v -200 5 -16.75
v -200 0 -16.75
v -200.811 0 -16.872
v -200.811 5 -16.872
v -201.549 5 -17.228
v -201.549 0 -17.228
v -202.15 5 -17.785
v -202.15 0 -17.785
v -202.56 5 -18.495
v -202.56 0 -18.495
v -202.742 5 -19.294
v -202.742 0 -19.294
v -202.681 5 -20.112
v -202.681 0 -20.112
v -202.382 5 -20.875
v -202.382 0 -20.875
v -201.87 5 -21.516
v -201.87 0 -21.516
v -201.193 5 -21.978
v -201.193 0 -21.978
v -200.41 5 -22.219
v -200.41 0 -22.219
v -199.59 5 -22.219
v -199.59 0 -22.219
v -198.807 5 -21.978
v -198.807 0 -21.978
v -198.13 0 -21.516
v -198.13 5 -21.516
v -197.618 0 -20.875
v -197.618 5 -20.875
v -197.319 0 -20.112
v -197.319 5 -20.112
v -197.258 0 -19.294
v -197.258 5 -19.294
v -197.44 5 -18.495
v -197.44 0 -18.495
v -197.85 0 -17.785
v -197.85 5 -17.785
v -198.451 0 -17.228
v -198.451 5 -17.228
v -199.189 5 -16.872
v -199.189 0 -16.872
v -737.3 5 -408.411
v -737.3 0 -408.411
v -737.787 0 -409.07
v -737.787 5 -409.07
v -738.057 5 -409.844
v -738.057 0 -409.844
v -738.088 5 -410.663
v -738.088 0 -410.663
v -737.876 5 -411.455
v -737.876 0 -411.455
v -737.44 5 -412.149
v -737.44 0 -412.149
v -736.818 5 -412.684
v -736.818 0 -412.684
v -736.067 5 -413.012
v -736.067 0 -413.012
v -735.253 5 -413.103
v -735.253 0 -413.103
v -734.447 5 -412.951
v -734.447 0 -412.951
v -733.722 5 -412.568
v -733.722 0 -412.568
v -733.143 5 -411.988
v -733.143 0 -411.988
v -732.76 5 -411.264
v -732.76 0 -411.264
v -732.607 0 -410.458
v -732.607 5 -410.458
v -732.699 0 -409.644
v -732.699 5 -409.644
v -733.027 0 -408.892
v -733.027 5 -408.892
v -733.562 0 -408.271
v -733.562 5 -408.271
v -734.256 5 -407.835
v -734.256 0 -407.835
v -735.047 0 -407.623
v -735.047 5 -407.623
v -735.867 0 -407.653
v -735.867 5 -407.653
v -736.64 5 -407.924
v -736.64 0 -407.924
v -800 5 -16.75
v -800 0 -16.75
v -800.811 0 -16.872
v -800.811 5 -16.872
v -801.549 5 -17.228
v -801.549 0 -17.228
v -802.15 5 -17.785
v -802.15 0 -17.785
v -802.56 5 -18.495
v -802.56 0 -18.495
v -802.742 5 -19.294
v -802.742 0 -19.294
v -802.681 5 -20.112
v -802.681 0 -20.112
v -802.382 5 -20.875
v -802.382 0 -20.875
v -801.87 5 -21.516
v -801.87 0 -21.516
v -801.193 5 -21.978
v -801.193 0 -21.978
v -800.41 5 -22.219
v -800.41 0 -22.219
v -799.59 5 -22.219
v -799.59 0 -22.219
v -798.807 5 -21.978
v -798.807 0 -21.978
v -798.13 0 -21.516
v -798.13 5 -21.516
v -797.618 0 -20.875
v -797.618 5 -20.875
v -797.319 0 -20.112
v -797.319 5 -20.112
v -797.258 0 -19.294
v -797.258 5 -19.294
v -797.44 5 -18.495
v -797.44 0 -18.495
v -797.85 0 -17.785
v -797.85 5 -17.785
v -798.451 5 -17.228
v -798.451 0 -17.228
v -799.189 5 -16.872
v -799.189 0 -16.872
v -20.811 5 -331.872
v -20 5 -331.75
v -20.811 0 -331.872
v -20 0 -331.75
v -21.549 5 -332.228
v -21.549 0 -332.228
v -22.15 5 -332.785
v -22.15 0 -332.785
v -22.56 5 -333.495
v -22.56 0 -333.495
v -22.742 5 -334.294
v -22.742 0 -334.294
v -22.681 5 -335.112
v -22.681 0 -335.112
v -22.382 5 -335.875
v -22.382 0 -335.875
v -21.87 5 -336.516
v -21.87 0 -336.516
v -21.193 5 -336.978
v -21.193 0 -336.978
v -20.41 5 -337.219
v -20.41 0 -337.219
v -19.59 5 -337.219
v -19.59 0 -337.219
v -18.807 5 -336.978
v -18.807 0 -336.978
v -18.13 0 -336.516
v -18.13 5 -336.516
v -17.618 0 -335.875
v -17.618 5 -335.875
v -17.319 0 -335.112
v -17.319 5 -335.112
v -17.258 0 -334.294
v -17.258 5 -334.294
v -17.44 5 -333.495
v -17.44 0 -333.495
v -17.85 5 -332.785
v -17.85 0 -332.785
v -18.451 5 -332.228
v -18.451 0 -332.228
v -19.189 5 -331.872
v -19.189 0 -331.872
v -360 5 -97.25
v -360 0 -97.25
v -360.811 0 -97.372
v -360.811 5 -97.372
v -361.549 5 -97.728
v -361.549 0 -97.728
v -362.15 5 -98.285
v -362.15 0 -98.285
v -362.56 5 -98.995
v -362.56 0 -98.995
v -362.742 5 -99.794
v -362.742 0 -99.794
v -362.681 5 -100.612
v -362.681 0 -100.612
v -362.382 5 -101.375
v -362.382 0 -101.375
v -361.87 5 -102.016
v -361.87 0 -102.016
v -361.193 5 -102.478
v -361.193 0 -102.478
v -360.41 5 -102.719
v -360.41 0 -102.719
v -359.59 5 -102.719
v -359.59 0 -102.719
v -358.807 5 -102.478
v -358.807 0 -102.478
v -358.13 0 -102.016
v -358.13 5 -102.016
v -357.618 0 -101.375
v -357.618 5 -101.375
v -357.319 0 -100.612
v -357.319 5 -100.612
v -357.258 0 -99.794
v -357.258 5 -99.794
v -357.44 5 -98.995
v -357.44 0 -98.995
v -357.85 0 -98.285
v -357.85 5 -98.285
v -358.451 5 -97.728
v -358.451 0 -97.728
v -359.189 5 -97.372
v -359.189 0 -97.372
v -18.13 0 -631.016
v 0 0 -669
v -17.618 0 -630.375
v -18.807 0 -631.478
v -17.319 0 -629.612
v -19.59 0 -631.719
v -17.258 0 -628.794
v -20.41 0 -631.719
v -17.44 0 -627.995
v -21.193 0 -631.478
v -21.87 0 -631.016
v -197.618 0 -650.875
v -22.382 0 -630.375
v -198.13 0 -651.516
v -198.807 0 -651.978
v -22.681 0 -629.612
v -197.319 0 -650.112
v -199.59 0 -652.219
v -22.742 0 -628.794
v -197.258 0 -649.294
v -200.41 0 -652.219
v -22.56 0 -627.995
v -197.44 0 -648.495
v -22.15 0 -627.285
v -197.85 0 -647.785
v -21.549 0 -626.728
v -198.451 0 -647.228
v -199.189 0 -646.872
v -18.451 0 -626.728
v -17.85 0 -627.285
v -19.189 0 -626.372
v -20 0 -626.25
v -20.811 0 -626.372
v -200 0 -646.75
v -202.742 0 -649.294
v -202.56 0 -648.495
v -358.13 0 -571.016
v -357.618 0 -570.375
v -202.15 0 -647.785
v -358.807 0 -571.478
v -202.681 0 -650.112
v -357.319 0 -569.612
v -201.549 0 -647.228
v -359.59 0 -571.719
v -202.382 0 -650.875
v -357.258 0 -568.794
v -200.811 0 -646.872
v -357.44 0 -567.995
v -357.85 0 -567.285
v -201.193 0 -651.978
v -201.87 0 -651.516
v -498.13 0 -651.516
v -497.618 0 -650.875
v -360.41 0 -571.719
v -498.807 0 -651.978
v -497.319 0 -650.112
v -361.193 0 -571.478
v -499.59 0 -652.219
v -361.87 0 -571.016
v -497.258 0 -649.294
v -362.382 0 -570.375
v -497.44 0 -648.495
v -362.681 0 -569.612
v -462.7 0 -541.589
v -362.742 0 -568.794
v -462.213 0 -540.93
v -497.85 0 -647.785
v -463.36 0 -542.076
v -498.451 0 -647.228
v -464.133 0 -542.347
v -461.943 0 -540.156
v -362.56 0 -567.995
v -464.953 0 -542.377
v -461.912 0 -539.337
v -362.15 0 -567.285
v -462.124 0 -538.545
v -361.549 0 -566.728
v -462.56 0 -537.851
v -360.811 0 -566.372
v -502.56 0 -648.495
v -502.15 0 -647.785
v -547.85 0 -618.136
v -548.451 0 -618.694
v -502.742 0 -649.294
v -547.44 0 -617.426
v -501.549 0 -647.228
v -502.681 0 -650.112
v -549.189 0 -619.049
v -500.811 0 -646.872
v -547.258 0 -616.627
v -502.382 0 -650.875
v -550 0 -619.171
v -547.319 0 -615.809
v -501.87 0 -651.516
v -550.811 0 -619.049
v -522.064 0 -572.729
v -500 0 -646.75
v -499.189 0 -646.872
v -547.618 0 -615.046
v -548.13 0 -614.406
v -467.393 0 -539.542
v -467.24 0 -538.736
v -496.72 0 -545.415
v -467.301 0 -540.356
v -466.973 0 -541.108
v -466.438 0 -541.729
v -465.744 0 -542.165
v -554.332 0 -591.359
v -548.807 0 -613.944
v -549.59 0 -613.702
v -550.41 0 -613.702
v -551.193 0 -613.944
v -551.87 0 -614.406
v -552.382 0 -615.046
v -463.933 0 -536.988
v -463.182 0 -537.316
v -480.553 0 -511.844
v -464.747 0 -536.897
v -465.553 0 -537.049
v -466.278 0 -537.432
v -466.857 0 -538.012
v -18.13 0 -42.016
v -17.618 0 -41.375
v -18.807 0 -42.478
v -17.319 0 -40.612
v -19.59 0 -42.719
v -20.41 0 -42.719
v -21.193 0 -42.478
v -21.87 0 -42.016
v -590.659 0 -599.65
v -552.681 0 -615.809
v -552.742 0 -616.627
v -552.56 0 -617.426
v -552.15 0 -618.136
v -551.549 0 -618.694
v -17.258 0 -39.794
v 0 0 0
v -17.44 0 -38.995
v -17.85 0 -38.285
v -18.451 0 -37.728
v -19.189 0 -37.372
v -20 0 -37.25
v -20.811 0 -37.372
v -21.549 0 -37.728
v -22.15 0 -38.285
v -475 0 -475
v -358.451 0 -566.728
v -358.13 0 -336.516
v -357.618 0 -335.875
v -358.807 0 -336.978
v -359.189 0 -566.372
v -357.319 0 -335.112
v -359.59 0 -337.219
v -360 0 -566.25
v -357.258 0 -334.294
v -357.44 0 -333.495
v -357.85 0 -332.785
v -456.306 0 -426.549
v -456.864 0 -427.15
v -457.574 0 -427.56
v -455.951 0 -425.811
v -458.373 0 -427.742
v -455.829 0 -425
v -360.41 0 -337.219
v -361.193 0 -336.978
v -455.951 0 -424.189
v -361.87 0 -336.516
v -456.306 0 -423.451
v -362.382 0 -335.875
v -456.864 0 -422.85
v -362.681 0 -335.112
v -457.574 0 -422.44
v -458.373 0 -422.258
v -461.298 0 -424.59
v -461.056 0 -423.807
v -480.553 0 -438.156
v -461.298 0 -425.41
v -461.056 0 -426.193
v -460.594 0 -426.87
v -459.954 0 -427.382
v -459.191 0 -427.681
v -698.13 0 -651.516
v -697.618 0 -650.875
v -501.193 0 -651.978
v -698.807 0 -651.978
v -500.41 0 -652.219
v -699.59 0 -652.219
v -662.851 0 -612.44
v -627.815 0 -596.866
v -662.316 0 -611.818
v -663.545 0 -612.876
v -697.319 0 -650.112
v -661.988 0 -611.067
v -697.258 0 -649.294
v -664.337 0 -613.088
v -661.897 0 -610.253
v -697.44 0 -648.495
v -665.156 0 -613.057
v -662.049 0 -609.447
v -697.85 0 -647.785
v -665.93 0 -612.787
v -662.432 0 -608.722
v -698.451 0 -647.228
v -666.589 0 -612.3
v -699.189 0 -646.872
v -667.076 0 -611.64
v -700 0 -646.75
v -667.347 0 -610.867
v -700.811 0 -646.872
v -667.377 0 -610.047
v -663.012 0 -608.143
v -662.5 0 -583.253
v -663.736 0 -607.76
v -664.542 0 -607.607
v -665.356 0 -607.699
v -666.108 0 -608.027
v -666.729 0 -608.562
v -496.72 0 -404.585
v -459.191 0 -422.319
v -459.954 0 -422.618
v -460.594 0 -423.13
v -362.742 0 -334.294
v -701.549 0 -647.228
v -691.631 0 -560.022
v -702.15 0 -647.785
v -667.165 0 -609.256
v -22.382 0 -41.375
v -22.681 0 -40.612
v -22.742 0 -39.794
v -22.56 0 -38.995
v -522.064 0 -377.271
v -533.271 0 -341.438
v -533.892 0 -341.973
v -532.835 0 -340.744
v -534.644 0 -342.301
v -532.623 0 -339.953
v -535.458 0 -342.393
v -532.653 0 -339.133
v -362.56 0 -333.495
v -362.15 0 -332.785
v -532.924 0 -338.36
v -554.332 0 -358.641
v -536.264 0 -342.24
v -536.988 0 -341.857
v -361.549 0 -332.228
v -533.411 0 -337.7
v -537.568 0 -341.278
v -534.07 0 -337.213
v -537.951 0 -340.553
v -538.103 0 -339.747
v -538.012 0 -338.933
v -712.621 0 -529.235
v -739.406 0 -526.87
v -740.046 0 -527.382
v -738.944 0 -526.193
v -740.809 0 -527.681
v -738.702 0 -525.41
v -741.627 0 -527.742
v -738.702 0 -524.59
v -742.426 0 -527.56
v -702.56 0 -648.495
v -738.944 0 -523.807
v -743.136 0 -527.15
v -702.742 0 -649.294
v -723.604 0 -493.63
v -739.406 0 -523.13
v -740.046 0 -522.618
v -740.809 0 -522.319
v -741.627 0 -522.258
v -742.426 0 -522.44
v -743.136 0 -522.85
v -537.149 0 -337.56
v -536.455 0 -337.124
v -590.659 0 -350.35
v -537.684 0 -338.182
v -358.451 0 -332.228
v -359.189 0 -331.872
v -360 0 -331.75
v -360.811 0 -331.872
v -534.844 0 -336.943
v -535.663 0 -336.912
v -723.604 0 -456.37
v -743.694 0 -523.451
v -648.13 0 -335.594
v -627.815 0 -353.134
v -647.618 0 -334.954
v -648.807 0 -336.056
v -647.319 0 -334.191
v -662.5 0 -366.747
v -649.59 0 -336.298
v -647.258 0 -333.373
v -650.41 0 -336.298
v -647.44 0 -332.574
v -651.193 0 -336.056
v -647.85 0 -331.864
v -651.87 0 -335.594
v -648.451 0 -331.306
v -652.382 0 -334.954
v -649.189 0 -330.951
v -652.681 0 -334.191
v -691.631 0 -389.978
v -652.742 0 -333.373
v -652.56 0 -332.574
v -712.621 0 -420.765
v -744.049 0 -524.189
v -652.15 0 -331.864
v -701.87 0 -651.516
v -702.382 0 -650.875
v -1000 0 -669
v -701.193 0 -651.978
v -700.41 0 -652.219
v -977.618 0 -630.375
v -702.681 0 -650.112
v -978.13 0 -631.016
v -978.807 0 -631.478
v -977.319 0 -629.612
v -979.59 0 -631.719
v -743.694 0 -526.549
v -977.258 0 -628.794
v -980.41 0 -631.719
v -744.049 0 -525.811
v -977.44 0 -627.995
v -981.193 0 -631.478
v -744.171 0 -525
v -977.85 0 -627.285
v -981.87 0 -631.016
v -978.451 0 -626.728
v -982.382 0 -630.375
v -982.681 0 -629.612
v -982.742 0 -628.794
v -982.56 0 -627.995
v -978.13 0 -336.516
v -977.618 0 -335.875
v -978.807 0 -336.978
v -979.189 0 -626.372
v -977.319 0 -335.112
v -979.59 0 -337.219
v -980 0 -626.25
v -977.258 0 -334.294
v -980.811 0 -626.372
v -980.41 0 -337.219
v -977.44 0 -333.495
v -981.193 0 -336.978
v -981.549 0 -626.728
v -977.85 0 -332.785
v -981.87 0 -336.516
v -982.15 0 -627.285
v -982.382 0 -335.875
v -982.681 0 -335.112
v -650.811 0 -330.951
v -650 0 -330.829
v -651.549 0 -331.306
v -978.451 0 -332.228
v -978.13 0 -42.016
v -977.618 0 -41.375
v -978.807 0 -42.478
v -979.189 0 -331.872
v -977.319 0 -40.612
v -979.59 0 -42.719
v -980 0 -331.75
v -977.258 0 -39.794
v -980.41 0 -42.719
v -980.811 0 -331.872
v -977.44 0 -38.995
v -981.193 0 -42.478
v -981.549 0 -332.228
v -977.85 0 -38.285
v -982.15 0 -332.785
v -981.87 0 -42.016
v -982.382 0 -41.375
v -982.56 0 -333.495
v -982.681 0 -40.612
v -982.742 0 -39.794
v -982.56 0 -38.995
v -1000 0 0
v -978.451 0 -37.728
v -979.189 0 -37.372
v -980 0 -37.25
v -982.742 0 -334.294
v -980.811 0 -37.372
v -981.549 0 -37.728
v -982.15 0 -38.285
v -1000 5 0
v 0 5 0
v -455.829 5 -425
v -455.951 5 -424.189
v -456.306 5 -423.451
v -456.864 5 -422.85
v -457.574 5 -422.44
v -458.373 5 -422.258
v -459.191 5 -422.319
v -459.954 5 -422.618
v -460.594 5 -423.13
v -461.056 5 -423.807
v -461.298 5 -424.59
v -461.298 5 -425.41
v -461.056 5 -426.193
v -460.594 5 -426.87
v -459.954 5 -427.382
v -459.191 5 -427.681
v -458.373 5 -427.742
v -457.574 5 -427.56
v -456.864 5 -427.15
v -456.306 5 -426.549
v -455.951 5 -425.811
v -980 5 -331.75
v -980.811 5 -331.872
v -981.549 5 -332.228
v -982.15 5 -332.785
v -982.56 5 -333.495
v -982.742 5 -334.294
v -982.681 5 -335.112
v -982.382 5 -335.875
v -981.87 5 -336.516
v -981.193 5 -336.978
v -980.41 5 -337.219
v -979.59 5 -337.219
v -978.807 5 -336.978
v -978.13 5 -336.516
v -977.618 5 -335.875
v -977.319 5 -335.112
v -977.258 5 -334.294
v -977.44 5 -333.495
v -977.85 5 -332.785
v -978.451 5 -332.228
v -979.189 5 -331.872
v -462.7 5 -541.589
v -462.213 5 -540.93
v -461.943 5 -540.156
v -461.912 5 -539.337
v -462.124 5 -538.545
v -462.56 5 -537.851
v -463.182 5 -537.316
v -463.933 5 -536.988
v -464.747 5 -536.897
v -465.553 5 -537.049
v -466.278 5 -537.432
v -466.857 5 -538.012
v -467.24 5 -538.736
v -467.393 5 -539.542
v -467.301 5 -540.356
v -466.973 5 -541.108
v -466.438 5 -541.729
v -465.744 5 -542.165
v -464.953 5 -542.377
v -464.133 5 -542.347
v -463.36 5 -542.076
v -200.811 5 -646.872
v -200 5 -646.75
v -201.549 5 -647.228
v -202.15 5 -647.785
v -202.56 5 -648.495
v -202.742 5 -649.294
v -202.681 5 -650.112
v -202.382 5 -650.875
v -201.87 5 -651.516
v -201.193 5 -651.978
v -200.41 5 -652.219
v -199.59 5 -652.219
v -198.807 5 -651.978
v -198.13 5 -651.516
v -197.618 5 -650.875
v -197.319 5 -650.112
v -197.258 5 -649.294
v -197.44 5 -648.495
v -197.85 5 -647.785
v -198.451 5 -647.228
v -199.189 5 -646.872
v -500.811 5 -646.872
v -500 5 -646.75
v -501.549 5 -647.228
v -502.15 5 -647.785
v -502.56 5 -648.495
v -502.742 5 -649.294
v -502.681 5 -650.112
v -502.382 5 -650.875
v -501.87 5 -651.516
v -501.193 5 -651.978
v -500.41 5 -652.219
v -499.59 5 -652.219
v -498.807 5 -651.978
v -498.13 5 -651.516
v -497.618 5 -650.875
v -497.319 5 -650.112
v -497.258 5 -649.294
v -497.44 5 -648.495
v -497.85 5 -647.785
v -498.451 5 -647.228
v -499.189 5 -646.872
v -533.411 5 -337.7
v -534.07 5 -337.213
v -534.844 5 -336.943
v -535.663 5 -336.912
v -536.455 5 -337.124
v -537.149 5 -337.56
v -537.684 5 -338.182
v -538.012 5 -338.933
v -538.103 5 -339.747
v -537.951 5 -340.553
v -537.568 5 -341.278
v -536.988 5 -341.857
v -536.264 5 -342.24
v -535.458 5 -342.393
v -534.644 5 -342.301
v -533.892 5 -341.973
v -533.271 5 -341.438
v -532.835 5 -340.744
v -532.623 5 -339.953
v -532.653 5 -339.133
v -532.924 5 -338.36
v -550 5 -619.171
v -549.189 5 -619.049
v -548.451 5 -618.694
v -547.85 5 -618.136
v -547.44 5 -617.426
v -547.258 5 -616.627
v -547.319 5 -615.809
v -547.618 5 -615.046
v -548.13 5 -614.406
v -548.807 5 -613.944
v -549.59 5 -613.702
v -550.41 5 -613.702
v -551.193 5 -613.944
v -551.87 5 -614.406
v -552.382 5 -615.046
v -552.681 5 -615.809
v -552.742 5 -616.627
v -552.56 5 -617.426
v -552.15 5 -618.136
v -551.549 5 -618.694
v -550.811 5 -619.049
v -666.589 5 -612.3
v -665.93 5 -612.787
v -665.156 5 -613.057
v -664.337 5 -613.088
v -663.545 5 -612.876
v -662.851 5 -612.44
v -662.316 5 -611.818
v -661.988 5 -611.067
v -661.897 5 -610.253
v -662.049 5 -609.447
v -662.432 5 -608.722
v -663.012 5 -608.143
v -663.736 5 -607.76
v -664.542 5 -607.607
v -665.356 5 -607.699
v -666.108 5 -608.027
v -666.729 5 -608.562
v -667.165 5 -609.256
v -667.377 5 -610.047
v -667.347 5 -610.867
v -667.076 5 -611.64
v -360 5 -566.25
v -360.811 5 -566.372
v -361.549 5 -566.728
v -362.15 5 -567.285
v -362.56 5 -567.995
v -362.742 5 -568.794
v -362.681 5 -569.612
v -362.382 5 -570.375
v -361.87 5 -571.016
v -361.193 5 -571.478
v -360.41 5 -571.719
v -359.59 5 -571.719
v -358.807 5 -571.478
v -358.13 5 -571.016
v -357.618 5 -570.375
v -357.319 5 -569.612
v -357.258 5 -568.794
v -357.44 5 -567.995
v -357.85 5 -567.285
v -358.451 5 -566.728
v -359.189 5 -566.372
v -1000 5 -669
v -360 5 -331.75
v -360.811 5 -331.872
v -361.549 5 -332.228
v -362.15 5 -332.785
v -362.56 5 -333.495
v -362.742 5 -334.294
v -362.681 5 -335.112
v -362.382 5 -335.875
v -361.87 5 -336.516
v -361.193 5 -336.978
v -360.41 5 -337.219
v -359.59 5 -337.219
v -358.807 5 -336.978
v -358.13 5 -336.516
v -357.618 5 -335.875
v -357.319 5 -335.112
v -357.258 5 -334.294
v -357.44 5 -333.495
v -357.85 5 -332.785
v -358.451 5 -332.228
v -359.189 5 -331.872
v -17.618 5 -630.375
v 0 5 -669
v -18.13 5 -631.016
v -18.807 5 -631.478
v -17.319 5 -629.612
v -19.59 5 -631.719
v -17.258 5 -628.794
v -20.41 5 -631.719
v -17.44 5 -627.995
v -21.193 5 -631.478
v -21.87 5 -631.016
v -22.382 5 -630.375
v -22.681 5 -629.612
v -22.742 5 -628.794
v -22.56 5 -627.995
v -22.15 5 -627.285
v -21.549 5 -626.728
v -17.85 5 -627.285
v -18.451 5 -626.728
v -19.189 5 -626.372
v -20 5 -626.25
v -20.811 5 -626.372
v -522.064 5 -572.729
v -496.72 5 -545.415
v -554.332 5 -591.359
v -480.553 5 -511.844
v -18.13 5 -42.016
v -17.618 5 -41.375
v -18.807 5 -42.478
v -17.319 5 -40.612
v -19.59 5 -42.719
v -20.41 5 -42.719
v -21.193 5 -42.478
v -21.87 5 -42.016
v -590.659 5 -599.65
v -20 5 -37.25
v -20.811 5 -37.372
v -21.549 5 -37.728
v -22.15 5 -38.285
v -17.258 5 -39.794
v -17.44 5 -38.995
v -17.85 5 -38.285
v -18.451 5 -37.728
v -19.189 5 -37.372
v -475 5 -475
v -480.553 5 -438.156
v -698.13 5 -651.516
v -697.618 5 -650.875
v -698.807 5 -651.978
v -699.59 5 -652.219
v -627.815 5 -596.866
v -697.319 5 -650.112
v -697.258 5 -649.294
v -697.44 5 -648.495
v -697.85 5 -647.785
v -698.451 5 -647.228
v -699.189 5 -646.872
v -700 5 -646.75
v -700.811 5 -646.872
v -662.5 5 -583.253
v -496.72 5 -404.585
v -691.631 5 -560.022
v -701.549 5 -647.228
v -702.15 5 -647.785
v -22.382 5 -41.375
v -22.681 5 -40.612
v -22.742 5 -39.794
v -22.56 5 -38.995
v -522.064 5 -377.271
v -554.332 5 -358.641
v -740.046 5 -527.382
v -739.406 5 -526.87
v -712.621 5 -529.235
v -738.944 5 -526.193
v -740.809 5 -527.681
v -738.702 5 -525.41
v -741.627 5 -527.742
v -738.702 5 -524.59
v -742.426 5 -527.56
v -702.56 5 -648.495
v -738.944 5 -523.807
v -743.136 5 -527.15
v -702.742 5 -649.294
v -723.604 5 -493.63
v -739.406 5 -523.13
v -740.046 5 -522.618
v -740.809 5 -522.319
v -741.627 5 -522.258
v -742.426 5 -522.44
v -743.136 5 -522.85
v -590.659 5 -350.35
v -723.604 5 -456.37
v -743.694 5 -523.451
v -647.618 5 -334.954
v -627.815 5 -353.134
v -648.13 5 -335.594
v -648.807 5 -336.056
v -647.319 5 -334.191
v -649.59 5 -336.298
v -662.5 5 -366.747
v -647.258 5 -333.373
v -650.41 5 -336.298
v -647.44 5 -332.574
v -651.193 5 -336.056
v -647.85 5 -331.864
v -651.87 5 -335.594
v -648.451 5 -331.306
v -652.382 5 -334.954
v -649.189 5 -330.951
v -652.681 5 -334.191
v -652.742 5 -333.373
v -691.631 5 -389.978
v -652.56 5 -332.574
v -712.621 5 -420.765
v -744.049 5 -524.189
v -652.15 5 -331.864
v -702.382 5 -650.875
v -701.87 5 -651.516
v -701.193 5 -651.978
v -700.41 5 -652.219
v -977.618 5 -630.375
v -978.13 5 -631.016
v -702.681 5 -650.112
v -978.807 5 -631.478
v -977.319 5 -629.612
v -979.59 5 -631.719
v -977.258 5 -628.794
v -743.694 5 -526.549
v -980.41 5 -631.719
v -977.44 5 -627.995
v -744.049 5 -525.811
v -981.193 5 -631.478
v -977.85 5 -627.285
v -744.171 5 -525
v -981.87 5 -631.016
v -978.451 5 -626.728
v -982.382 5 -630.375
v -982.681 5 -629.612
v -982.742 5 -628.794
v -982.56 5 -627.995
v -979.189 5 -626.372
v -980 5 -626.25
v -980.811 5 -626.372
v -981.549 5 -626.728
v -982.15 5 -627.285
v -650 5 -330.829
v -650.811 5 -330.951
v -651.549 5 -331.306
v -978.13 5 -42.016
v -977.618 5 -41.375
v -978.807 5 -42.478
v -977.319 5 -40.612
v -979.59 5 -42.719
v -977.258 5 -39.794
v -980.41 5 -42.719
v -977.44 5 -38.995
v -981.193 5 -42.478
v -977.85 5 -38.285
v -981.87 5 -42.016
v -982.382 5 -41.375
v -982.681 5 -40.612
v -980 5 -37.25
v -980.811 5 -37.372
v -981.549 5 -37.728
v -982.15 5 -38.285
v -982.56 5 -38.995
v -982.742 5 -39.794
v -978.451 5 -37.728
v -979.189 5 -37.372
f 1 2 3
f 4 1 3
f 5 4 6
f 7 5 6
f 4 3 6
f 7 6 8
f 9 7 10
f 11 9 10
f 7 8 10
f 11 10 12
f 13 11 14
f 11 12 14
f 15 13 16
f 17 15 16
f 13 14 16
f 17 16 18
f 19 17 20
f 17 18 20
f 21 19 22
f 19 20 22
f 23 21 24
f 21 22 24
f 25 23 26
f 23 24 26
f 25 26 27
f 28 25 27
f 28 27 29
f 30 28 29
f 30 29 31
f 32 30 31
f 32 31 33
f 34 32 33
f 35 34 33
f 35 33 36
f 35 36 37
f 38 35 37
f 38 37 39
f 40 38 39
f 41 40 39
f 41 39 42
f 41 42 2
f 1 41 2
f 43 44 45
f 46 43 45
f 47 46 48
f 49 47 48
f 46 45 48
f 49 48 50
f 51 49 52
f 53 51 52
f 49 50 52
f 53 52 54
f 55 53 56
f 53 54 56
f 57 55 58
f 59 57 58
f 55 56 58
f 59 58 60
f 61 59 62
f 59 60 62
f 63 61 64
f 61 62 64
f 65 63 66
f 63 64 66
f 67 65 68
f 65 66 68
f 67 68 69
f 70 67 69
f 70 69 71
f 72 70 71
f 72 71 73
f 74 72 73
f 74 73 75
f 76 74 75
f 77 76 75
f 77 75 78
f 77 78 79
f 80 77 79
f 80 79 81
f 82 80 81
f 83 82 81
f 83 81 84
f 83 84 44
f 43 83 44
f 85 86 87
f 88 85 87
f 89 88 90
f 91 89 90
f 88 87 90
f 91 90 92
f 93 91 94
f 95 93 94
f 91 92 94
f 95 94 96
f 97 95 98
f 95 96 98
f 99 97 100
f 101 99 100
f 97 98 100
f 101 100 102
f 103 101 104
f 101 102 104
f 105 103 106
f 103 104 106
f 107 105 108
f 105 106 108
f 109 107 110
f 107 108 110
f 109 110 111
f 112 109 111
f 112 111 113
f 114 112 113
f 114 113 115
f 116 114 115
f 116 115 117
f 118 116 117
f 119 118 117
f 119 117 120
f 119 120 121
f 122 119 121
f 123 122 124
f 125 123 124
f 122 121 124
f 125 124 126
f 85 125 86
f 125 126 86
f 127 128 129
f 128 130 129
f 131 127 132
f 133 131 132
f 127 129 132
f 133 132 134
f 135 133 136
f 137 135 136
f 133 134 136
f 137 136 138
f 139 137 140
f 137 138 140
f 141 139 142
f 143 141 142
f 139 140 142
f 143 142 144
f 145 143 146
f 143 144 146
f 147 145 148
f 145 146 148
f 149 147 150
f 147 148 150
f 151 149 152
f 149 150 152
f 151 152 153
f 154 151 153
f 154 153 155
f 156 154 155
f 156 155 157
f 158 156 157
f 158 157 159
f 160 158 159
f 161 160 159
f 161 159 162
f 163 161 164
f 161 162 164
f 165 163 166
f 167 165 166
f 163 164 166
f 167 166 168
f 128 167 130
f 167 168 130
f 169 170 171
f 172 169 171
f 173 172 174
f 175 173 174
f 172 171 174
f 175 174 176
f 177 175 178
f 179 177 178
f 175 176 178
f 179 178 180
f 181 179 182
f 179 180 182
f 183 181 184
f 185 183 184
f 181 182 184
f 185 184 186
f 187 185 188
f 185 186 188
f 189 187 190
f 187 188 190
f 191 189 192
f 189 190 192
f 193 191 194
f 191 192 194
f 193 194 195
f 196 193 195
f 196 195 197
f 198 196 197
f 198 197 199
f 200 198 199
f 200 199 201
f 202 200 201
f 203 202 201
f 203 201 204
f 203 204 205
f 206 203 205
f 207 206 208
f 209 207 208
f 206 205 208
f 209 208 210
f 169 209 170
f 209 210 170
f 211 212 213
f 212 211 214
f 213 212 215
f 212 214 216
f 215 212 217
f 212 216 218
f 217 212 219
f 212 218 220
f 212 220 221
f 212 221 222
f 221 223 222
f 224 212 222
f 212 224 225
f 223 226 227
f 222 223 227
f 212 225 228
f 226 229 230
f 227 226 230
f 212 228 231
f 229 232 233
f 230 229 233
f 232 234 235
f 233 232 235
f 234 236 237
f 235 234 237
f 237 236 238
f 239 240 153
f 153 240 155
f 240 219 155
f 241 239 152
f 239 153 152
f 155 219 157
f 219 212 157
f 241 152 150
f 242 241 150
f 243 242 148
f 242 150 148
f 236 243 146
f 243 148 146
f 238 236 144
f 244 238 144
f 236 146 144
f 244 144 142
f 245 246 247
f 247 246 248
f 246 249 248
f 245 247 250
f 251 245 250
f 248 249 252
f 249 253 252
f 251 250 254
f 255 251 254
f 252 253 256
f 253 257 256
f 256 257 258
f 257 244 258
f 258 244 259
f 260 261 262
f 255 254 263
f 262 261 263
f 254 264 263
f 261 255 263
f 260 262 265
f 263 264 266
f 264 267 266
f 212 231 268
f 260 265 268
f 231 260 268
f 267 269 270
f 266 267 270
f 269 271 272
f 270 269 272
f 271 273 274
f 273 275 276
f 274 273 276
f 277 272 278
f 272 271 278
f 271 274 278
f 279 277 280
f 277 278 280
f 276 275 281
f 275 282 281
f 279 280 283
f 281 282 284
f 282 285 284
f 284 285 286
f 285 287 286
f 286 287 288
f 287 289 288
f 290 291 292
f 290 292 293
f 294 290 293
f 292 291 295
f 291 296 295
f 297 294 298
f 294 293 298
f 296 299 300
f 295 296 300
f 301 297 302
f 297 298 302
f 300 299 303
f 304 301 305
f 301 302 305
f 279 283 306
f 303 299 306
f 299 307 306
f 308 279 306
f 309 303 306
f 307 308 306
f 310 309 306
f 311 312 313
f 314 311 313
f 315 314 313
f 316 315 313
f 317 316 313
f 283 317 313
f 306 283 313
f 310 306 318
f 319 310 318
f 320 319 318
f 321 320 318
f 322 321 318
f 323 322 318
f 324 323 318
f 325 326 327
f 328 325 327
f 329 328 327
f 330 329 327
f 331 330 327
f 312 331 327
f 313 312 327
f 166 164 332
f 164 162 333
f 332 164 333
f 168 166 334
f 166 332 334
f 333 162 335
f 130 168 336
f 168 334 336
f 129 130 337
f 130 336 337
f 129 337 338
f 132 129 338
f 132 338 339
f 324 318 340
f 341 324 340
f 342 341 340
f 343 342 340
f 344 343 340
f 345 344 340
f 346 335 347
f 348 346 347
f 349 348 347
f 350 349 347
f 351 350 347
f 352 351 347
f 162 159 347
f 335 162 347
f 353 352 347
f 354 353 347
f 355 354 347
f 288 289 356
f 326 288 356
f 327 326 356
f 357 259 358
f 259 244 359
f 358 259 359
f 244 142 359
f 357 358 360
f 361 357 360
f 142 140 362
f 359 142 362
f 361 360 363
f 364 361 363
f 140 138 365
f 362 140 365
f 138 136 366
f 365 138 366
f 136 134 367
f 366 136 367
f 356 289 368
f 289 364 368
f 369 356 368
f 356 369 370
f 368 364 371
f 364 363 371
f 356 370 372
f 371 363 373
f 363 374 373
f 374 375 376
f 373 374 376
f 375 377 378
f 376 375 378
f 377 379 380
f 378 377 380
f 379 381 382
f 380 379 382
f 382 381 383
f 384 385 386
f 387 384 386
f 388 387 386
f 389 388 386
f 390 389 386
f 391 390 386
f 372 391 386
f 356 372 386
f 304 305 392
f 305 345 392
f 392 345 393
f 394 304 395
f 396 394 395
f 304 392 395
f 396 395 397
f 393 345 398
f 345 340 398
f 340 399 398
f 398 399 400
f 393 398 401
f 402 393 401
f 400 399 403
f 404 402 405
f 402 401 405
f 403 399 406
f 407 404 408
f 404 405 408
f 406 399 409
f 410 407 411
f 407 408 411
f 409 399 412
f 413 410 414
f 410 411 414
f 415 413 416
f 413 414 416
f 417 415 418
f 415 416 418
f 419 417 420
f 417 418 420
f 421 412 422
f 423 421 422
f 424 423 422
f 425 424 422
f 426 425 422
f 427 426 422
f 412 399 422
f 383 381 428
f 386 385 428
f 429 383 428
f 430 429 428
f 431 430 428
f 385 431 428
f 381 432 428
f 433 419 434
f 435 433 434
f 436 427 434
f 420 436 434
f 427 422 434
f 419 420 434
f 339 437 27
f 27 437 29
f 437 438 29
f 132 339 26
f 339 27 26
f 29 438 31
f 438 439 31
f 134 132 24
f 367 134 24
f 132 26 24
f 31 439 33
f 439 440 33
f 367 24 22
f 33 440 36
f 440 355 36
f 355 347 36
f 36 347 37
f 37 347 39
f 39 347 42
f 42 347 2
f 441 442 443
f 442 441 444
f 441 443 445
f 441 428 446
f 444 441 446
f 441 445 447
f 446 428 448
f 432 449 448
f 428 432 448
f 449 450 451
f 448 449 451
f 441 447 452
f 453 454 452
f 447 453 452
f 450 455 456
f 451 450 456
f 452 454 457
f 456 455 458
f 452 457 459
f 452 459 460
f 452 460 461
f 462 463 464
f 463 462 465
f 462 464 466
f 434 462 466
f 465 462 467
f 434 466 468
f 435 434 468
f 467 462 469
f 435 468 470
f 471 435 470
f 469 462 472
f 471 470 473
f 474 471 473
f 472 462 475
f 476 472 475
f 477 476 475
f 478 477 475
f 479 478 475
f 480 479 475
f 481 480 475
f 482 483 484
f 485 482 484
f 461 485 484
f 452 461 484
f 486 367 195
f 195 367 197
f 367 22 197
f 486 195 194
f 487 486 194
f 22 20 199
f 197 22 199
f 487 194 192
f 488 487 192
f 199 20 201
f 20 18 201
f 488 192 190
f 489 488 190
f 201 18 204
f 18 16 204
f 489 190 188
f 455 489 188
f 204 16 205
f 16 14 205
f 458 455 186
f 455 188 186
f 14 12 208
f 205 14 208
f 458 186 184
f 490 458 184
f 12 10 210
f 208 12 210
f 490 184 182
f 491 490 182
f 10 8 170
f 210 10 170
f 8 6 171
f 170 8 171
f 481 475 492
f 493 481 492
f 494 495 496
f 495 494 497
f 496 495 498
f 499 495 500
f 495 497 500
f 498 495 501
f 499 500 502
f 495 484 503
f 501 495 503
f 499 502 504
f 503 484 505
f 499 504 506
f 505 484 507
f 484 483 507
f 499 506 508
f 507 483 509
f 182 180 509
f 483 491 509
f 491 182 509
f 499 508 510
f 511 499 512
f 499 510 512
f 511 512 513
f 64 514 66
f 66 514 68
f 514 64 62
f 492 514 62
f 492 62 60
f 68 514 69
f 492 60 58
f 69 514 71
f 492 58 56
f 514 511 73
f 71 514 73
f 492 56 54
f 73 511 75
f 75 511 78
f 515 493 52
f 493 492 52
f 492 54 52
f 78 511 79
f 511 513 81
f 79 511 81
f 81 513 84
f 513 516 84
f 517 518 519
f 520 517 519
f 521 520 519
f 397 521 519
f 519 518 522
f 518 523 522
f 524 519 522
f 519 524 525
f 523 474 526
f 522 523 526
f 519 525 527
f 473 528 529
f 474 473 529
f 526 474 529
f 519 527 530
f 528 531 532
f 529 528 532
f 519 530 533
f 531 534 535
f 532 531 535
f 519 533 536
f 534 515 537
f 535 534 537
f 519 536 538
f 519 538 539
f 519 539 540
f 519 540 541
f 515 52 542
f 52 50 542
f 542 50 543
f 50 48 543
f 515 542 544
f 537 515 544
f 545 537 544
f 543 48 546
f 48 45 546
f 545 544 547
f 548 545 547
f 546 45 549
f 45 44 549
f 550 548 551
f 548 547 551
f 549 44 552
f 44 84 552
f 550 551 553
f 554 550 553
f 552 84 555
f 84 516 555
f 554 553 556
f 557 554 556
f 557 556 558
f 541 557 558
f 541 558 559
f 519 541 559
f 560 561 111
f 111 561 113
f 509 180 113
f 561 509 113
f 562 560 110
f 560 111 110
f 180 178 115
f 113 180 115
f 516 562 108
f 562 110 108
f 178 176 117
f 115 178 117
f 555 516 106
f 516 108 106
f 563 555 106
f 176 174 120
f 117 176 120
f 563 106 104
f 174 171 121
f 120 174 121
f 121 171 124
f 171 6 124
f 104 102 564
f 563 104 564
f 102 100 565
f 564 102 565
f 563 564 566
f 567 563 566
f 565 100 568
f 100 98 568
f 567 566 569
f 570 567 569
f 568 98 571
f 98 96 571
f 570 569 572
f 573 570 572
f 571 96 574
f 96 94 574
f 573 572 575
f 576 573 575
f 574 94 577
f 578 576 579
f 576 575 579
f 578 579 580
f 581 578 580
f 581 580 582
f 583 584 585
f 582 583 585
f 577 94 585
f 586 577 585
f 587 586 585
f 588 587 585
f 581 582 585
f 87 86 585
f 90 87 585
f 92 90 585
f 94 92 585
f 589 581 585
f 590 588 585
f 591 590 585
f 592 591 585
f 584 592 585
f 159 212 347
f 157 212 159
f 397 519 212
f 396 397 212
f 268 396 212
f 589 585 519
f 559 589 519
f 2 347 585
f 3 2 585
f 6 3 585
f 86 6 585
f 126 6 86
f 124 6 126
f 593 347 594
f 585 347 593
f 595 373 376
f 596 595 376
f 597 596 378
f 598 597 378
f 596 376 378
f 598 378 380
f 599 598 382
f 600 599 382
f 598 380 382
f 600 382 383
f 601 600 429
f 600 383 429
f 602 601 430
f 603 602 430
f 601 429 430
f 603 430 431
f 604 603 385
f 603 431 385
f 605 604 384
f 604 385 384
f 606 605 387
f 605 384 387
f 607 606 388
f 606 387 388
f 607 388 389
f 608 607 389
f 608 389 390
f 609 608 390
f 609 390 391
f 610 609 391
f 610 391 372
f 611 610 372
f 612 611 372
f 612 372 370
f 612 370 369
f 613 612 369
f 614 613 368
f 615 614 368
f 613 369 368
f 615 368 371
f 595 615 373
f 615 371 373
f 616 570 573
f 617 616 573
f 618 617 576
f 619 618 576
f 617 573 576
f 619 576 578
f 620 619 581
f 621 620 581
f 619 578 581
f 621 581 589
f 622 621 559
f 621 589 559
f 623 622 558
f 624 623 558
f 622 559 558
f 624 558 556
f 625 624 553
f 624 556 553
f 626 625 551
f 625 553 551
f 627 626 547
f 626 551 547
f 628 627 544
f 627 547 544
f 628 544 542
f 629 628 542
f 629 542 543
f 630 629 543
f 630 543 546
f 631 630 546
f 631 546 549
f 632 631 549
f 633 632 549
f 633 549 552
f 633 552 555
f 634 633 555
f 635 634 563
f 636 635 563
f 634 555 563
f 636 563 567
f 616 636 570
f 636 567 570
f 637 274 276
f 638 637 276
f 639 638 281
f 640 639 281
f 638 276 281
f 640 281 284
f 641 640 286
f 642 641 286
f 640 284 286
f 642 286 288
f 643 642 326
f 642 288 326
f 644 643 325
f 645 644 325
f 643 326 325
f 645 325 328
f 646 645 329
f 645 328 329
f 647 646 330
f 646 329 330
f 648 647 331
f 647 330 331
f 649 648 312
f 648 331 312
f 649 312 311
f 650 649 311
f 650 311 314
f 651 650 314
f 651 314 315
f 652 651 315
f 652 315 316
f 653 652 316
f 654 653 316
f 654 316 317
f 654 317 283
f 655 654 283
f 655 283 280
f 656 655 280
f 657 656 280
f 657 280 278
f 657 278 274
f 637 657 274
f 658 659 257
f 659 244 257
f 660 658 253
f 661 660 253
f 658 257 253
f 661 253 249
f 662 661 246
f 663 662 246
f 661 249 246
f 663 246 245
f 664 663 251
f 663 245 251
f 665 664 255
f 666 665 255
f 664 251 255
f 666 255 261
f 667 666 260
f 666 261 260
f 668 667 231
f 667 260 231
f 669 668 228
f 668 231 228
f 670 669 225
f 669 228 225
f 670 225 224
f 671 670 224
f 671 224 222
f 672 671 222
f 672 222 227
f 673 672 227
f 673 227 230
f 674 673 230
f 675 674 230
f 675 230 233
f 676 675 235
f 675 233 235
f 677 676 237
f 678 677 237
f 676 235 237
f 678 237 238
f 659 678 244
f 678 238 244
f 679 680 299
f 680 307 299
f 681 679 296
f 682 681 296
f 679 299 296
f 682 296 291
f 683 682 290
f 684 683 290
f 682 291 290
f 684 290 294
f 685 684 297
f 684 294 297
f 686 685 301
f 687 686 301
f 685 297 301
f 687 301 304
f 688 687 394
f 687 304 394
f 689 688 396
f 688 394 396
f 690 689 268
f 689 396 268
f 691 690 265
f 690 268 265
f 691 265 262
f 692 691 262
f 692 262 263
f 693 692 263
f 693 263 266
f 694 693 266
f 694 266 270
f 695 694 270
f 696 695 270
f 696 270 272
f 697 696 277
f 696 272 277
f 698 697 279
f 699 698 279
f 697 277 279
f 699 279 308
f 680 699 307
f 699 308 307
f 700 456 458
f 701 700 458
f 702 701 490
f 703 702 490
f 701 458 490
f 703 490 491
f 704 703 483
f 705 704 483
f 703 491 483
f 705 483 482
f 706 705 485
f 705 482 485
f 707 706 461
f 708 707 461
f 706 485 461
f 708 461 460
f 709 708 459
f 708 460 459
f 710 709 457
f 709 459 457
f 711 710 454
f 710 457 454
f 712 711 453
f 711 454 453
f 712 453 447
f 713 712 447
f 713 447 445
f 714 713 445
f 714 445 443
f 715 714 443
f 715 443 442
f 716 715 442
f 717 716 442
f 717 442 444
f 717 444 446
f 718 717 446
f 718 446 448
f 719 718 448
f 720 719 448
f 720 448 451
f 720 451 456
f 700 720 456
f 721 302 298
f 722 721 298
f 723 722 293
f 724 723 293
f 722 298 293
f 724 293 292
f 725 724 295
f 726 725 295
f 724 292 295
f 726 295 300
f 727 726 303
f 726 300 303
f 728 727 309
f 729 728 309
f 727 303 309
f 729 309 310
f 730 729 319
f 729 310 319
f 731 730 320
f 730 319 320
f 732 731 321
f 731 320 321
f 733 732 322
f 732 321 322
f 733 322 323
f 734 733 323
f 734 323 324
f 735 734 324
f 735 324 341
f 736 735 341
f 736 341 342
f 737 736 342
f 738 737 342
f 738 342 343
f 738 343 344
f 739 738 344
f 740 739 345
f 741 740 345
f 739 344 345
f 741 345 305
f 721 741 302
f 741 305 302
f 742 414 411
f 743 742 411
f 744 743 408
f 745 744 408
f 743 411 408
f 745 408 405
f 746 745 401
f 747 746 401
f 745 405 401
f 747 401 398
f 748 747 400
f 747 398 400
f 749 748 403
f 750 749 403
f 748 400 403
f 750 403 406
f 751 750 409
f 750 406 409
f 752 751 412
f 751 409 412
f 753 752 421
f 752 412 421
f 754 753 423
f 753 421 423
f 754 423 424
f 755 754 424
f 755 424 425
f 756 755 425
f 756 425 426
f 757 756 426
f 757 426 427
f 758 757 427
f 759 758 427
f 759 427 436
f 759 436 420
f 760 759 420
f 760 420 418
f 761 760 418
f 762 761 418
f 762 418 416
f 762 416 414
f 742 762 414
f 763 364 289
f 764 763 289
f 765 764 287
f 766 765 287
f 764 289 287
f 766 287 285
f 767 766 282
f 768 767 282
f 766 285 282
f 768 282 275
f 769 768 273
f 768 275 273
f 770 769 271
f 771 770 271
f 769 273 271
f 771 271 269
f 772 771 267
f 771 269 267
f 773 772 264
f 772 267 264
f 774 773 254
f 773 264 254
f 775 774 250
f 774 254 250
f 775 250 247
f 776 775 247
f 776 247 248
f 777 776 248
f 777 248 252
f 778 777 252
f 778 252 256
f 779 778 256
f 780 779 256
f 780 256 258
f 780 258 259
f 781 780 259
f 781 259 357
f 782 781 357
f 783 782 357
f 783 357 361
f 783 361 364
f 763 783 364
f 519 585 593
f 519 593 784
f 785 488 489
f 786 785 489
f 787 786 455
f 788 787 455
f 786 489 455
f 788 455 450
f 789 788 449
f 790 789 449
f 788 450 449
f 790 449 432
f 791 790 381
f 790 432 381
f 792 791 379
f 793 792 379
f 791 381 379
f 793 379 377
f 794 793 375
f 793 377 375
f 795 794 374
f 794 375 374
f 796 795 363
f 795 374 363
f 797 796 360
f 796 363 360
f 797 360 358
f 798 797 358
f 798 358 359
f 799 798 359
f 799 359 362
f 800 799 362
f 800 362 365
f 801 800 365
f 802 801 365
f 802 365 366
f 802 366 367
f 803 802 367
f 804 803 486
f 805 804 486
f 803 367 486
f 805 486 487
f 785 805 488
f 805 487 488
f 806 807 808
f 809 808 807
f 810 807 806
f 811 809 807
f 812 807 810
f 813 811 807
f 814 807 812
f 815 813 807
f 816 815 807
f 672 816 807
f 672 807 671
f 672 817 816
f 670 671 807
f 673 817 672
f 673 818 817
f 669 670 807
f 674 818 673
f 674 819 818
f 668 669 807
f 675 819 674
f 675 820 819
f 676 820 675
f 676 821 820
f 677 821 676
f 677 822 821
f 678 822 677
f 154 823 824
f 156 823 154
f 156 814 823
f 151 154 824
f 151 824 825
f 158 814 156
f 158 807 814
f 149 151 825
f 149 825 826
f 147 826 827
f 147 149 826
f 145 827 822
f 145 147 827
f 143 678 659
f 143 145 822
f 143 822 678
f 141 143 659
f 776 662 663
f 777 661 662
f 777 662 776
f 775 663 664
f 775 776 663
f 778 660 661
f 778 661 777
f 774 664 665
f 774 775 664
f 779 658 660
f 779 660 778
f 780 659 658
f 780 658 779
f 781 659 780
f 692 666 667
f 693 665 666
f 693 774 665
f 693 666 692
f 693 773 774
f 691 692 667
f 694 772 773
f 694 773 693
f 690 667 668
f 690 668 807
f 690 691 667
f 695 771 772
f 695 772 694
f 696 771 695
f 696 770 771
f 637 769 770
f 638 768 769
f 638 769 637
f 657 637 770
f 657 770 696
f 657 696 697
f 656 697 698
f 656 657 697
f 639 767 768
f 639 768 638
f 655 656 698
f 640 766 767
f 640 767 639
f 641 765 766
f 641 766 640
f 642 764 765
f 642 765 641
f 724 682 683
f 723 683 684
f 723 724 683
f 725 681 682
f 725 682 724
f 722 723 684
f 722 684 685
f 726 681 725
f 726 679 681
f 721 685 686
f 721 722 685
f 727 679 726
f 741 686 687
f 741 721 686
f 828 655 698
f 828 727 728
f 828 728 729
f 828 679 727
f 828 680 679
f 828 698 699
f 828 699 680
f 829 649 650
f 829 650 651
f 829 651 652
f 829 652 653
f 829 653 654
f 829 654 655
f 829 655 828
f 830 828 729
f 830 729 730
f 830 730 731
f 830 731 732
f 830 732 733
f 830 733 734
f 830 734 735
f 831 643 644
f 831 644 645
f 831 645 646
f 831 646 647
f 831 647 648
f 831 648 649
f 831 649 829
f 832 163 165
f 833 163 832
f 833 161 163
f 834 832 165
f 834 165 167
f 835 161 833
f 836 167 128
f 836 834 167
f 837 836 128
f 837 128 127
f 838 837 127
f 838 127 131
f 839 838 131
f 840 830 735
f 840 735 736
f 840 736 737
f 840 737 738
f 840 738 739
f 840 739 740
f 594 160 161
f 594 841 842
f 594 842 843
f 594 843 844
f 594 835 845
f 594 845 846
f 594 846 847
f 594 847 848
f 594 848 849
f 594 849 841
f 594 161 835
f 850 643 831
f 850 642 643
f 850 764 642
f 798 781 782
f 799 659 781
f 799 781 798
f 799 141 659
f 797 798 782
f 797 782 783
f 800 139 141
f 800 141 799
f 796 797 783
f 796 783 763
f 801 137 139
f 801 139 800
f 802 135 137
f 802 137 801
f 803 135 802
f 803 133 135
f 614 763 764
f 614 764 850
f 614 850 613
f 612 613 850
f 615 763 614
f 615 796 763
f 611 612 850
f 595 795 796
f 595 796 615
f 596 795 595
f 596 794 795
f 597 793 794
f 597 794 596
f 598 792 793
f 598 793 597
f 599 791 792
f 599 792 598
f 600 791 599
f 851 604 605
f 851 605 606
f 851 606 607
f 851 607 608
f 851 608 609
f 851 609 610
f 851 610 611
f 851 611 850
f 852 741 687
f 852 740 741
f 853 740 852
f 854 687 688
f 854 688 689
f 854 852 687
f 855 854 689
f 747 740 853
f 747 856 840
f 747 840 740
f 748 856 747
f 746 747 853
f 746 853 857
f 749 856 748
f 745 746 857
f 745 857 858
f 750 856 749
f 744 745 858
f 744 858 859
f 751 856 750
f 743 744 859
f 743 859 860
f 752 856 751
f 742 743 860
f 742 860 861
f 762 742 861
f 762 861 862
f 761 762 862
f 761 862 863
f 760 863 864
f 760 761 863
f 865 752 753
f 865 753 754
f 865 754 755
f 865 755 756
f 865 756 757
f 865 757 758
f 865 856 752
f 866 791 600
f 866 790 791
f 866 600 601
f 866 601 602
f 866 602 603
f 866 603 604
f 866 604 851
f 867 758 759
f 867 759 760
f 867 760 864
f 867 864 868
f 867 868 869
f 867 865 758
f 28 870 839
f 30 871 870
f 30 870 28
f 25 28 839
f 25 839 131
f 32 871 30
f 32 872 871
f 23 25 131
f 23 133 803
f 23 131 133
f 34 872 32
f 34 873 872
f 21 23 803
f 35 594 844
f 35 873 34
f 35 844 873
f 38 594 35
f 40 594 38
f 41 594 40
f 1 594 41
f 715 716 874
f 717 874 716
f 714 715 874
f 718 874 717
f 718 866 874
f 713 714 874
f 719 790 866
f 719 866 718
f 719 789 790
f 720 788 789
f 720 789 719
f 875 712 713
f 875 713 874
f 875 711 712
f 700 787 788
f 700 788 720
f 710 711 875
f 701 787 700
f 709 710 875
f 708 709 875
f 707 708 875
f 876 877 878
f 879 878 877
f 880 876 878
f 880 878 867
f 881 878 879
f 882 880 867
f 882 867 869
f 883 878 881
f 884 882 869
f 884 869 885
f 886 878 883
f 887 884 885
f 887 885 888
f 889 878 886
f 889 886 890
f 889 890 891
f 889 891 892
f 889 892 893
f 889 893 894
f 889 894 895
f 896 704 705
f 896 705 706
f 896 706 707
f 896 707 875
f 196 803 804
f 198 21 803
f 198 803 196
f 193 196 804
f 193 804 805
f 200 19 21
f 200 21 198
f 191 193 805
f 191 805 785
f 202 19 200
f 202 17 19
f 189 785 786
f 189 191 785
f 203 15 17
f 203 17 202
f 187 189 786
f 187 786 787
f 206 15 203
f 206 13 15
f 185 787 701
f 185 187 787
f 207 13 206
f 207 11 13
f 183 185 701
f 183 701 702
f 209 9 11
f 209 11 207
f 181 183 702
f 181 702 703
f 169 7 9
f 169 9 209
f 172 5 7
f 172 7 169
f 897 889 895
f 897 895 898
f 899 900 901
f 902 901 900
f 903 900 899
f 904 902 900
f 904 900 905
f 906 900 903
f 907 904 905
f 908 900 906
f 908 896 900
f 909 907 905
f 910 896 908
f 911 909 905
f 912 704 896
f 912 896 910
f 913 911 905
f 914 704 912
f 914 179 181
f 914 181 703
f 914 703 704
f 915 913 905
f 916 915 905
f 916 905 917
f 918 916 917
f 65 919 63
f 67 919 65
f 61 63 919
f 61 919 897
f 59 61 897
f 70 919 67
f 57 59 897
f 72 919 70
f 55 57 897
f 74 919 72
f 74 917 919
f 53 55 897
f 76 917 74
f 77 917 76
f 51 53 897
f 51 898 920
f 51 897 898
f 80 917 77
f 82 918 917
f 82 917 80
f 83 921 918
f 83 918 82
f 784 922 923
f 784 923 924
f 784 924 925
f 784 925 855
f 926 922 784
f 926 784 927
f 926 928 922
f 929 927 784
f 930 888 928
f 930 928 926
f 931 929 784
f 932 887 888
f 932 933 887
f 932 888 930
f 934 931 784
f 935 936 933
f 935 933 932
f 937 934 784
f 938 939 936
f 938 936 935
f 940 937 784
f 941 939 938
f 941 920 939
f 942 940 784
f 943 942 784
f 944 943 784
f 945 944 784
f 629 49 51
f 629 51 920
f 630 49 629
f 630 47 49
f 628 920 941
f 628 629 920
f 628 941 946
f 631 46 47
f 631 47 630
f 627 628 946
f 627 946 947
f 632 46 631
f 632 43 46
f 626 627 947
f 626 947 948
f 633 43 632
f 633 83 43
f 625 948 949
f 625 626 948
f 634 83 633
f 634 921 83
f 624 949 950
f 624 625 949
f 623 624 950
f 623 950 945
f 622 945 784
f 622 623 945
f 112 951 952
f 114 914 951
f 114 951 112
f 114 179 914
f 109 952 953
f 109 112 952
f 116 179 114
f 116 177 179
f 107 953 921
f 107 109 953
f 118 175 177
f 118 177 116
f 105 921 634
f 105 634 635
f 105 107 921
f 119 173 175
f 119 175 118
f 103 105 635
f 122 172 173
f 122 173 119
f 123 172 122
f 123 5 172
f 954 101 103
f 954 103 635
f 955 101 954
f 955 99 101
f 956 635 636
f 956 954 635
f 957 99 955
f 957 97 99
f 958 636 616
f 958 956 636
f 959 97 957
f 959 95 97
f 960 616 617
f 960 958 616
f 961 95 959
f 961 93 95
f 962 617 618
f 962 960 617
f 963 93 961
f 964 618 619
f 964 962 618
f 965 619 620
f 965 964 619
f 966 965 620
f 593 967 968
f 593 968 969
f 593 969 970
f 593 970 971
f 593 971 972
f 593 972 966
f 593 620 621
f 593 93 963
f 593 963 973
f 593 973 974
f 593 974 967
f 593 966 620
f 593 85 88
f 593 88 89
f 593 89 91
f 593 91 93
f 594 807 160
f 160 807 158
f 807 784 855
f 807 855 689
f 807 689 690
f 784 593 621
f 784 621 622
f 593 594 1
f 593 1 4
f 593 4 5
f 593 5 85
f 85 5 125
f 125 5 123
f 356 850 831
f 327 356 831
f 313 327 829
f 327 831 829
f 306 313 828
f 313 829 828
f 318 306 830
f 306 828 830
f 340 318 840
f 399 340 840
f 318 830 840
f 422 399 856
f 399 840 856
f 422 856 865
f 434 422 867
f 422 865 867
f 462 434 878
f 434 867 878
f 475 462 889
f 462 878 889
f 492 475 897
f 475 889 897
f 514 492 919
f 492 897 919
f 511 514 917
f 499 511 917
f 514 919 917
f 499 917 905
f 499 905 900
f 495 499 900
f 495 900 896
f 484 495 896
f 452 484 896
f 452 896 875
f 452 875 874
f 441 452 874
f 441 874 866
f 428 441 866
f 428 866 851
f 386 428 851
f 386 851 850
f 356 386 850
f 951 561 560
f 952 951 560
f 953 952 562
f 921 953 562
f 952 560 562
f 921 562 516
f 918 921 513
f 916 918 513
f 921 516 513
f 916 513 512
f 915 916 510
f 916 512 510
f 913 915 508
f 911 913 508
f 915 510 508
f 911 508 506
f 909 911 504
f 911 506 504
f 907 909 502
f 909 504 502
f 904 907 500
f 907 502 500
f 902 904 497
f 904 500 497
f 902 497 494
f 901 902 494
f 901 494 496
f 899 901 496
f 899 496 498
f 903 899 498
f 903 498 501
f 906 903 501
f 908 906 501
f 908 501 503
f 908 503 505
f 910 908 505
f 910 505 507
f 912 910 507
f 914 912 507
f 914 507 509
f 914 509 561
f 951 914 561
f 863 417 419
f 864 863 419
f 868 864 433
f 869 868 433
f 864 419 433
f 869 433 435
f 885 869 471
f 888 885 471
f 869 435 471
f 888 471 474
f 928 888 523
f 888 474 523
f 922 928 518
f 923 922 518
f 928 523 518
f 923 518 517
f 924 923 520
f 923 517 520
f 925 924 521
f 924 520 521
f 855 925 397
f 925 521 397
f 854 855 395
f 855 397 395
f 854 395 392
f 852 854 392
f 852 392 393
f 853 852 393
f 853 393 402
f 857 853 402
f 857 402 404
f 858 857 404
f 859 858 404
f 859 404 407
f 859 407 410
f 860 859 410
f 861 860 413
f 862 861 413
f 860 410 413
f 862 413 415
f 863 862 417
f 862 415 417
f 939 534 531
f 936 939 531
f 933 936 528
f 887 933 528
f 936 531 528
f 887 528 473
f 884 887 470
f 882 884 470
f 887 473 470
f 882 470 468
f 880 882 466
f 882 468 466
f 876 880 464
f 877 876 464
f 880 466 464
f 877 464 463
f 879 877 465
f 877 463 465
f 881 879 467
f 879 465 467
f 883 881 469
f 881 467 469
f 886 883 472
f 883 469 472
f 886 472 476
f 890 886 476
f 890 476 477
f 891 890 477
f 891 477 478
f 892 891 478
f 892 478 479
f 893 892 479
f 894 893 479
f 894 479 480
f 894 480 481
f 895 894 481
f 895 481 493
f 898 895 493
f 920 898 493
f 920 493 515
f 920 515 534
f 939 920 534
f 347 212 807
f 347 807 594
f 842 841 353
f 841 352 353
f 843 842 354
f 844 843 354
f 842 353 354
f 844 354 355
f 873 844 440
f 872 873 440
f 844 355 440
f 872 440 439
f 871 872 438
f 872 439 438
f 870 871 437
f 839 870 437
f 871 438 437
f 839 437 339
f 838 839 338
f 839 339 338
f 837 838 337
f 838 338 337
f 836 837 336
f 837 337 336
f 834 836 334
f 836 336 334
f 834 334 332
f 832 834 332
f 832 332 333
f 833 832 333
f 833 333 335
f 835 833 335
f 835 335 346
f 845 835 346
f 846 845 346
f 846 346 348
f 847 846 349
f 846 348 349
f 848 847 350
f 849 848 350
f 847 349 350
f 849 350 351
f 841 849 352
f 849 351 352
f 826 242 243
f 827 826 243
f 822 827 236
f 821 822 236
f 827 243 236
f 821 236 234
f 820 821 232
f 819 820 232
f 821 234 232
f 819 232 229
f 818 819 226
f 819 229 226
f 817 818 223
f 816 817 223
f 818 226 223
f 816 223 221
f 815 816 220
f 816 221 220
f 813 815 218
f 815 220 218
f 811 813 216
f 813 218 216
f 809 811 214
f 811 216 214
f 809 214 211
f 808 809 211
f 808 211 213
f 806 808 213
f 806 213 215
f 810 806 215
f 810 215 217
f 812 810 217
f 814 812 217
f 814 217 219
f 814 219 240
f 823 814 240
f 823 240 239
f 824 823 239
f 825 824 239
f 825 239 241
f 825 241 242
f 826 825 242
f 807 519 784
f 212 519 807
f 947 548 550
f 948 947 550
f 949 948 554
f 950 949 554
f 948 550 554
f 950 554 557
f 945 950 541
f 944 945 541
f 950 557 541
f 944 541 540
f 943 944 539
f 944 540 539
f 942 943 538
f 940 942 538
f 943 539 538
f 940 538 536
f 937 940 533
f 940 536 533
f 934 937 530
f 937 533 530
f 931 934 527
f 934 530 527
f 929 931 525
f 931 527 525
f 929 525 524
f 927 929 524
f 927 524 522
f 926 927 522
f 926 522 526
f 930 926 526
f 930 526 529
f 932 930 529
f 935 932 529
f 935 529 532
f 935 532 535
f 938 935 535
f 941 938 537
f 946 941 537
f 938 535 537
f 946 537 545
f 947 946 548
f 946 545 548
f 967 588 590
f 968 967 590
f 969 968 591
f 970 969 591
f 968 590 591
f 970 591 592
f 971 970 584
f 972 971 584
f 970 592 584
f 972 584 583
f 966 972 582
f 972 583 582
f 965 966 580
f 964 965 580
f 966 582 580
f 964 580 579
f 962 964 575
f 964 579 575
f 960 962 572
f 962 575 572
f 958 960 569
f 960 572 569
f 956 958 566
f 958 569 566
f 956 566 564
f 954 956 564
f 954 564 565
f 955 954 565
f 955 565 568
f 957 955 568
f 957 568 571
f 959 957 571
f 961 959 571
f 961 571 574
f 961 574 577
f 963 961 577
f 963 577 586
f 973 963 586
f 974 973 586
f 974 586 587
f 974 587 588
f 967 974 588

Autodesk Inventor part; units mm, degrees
ref_plane "YZ Plane" through (0, 0, 0) normal (1, 0, 0) x (0, 1, 0)
ref_plane "XZ Plane" through (0, 0, 0) normal (0, 1, 0) x (-1, 0, 0)
ref_plane "XY Plane" through (0, 0, 0) normal (0, 0, 1) x (1, 0, 0)
sketch "Sketch1" plane through (0, 0, 0) normal (0, 1, 0) x (-1, 0, 0)
  line L0 (0, 0) -> (1000, 0)
  line L1 (1000, 0) -> (1000, -669)
  line L2 (1000, -669) -> (0, -669)
  line L3 (0, -669) -> (0, 0)
  dimension "d0" = 1000
  dimension "d1" = 669
extrude "Extrusion1" add sketch "Sketch1" along normal blind 5
sketch "Sketch2" plane through (0, 5, 0) normal (0, 1, 0) x (1, 0, 0)
  circle A0 centre (-600, 475) radius 125
  line L0 (-1000, 0) -> (0, 0) projected
  line L1 (0, 0) -> (0, 669) projected
  dimension "d4" = 250
  dimension "d5" = 475
  dimension "d6" = 600
extrude "Extrusion2" cut sketch "Sketch2" against normal through all
sketch "Sketch3" plane through (0, 5, 0) normal (0, 1, 0) x (1, 0, 0)
  line L0 (0, 0) -> (0, 669) projected
  line L1 (-1000, 0) -> (0, 0) projected
  line L2 (0, 669) -> (-1000, 669) projected
  line L3 (-1000, 669) -> (-1000, 0) projected
  point P0 (-20, 40)
  point P1 (-20, 334.5)
  point P2 (-20, 629)
  point P3 (-980, 40)
  point P4 (-980, 334.5)
  point P5 (-980, 629)
  dimension "d9" = 20
  dimension "d11" = 40
  dimension "d12" = 334.5
  dimension "d13" = 20
  dimension "d14" = 40
  dimension "d15" = 20
  dimension "d16" = 40
  dimension "d17" = 20
  dimension "d18" = 334.5
  dimension "d19" = 20
  dimension "d20" = 20
  dimension "d21" = 40
hole "Hole1" at (-20, 5, -40) at (-20, 5, -334.5) at (-20, 5, -629) at (-980, 5, -40) at (-980, 5, -334.5) at (-980, 5, -629) direction (0, -1, 0) diameter 5.5 end through all
sketch "Sketch5" plane through (0, 5, 0) normal (0, 1, 0) x (1, 0, 0)
  point P0 (0, 0)
sketch "Sketch6" plane through (0, 5, 0) normal (0, 1, 0) x (1, 0, 0)
  line L0 (-1000, 0) -> (0, 0) projected
  line L1 (0, 0) -> (0, 669) projected
  circle A0 centre (-600, 475) radius 125 projected
  point P0 (-650, 333.5786)
  dimension "d48" = 650
  dimension "d49" = 150
hole "Hole3" at (-650, 5, -333.5786) direction (0, -1, 0) diameter 5.5 end through all
pattern_circular "Circular Pattern1" count 8 over 360 about axis through (-600, 5, -475) along (0, -1, 0) of "Hole3"
sketch "Sketch7" plane through (0, 5, 0) normal (0, 1, 0) x (1, 0, 0)
  line L0 (-1000, 0) -> (0, 0) projected
  line L1 (0, 0) -> (0, 669) projected
  line L2 (0, 669) -> (-1000, 669) projected
  point P0 (-800, 19.5)
  point P1 (-700, 649.5)
  dimension "d54" = 19.5
  dimension "d55" = 700
  dimension "d56" = 800
  dimension "d68" = 19.5
hole "Hole4" at (-700, 5, -649.5) at (-800, 5, -19.5) direction (0, -1, 0) diameter 5.5 end through all
sketch "Sketch8" plane through (0, 5, 0) normal (0, 1, 0) x (1, 0, 0)
  line L0 (-1000, 0) -> (0, 0) projected
  line L1 (0, 0) -> (0, 669) projected
  line L2 (0, 669) -> (-1000, 669) projected
  point P0 (-200, 19.5)
  point P1 (-200, 649.5)
  dimension "d80" = 19.5
  dimension "d81" = 200
  dimension "d82" = 200
  dimension "d83" = 19.5
hole "Hole5" at (-200, 5, -19.5) at (-200, 5, -649.5) direction (0, -1, 0) diameter 5.5 end through all
sketch "Sketch9" plane through (0, 5, 0) normal (0, 1, 0) x (1, 0, 0)
  line L0 (0, 0) -> (0, 669) projected
  line L1 (0, 669) -> (-1000, 669) projected
  point P0 (-500, 649.5)
  dimension "d84" = 500
  dimension "d85" = 19.5
hole "Hole6" at (-500, 5, -649.5) direction (0, -1, 0) diameter 5.5 end through all
sketch "Sketch10" plane through (0, 5, 0) normal (0, 1, 0) x (1, 0, 0)
  line L0 (-1000, 0) -> (0, 0) projected
  line L1 (0, 669) -> (-1000, 669) projected
  line L2 (0, 0) -> (0, 669) projected
  point P0 (-360, 100)
  point P1 (-360, 569)
  point P2 (-360, 334.5)
  dimension "d93" = 100
  dimension "d94" = 334.5
  dimension "d95" = 100
  dimension "d103" = 360
  dimension "d104" = 360
  dimension "d105" = 360
hole "Hole7" at (-360, 5, -100) at (-360, 5, -334.5) at (-360, 5, -569) direction (0, -1, 0) diameter 5.5 end through all
equation "\"d13\" = d9"
equation "\"d14\" = d11"
equation "\"d15\" = d9"
equation "\"d16\" = d11"
equation "\"d17\" = d9"
equation "\"d18\" = d12"
equation "\"d19\" = d9"
equation "\"d20\" = d9"
equation "\"d21\" = d11"
equation "\"d68\" = d54"
equation "\"d82\" = d81"
equation "\"d83\" = d80"
equation "\"d104\" = d103"
equation "\"d105\" = d103"
properties part number "RearPanel"
